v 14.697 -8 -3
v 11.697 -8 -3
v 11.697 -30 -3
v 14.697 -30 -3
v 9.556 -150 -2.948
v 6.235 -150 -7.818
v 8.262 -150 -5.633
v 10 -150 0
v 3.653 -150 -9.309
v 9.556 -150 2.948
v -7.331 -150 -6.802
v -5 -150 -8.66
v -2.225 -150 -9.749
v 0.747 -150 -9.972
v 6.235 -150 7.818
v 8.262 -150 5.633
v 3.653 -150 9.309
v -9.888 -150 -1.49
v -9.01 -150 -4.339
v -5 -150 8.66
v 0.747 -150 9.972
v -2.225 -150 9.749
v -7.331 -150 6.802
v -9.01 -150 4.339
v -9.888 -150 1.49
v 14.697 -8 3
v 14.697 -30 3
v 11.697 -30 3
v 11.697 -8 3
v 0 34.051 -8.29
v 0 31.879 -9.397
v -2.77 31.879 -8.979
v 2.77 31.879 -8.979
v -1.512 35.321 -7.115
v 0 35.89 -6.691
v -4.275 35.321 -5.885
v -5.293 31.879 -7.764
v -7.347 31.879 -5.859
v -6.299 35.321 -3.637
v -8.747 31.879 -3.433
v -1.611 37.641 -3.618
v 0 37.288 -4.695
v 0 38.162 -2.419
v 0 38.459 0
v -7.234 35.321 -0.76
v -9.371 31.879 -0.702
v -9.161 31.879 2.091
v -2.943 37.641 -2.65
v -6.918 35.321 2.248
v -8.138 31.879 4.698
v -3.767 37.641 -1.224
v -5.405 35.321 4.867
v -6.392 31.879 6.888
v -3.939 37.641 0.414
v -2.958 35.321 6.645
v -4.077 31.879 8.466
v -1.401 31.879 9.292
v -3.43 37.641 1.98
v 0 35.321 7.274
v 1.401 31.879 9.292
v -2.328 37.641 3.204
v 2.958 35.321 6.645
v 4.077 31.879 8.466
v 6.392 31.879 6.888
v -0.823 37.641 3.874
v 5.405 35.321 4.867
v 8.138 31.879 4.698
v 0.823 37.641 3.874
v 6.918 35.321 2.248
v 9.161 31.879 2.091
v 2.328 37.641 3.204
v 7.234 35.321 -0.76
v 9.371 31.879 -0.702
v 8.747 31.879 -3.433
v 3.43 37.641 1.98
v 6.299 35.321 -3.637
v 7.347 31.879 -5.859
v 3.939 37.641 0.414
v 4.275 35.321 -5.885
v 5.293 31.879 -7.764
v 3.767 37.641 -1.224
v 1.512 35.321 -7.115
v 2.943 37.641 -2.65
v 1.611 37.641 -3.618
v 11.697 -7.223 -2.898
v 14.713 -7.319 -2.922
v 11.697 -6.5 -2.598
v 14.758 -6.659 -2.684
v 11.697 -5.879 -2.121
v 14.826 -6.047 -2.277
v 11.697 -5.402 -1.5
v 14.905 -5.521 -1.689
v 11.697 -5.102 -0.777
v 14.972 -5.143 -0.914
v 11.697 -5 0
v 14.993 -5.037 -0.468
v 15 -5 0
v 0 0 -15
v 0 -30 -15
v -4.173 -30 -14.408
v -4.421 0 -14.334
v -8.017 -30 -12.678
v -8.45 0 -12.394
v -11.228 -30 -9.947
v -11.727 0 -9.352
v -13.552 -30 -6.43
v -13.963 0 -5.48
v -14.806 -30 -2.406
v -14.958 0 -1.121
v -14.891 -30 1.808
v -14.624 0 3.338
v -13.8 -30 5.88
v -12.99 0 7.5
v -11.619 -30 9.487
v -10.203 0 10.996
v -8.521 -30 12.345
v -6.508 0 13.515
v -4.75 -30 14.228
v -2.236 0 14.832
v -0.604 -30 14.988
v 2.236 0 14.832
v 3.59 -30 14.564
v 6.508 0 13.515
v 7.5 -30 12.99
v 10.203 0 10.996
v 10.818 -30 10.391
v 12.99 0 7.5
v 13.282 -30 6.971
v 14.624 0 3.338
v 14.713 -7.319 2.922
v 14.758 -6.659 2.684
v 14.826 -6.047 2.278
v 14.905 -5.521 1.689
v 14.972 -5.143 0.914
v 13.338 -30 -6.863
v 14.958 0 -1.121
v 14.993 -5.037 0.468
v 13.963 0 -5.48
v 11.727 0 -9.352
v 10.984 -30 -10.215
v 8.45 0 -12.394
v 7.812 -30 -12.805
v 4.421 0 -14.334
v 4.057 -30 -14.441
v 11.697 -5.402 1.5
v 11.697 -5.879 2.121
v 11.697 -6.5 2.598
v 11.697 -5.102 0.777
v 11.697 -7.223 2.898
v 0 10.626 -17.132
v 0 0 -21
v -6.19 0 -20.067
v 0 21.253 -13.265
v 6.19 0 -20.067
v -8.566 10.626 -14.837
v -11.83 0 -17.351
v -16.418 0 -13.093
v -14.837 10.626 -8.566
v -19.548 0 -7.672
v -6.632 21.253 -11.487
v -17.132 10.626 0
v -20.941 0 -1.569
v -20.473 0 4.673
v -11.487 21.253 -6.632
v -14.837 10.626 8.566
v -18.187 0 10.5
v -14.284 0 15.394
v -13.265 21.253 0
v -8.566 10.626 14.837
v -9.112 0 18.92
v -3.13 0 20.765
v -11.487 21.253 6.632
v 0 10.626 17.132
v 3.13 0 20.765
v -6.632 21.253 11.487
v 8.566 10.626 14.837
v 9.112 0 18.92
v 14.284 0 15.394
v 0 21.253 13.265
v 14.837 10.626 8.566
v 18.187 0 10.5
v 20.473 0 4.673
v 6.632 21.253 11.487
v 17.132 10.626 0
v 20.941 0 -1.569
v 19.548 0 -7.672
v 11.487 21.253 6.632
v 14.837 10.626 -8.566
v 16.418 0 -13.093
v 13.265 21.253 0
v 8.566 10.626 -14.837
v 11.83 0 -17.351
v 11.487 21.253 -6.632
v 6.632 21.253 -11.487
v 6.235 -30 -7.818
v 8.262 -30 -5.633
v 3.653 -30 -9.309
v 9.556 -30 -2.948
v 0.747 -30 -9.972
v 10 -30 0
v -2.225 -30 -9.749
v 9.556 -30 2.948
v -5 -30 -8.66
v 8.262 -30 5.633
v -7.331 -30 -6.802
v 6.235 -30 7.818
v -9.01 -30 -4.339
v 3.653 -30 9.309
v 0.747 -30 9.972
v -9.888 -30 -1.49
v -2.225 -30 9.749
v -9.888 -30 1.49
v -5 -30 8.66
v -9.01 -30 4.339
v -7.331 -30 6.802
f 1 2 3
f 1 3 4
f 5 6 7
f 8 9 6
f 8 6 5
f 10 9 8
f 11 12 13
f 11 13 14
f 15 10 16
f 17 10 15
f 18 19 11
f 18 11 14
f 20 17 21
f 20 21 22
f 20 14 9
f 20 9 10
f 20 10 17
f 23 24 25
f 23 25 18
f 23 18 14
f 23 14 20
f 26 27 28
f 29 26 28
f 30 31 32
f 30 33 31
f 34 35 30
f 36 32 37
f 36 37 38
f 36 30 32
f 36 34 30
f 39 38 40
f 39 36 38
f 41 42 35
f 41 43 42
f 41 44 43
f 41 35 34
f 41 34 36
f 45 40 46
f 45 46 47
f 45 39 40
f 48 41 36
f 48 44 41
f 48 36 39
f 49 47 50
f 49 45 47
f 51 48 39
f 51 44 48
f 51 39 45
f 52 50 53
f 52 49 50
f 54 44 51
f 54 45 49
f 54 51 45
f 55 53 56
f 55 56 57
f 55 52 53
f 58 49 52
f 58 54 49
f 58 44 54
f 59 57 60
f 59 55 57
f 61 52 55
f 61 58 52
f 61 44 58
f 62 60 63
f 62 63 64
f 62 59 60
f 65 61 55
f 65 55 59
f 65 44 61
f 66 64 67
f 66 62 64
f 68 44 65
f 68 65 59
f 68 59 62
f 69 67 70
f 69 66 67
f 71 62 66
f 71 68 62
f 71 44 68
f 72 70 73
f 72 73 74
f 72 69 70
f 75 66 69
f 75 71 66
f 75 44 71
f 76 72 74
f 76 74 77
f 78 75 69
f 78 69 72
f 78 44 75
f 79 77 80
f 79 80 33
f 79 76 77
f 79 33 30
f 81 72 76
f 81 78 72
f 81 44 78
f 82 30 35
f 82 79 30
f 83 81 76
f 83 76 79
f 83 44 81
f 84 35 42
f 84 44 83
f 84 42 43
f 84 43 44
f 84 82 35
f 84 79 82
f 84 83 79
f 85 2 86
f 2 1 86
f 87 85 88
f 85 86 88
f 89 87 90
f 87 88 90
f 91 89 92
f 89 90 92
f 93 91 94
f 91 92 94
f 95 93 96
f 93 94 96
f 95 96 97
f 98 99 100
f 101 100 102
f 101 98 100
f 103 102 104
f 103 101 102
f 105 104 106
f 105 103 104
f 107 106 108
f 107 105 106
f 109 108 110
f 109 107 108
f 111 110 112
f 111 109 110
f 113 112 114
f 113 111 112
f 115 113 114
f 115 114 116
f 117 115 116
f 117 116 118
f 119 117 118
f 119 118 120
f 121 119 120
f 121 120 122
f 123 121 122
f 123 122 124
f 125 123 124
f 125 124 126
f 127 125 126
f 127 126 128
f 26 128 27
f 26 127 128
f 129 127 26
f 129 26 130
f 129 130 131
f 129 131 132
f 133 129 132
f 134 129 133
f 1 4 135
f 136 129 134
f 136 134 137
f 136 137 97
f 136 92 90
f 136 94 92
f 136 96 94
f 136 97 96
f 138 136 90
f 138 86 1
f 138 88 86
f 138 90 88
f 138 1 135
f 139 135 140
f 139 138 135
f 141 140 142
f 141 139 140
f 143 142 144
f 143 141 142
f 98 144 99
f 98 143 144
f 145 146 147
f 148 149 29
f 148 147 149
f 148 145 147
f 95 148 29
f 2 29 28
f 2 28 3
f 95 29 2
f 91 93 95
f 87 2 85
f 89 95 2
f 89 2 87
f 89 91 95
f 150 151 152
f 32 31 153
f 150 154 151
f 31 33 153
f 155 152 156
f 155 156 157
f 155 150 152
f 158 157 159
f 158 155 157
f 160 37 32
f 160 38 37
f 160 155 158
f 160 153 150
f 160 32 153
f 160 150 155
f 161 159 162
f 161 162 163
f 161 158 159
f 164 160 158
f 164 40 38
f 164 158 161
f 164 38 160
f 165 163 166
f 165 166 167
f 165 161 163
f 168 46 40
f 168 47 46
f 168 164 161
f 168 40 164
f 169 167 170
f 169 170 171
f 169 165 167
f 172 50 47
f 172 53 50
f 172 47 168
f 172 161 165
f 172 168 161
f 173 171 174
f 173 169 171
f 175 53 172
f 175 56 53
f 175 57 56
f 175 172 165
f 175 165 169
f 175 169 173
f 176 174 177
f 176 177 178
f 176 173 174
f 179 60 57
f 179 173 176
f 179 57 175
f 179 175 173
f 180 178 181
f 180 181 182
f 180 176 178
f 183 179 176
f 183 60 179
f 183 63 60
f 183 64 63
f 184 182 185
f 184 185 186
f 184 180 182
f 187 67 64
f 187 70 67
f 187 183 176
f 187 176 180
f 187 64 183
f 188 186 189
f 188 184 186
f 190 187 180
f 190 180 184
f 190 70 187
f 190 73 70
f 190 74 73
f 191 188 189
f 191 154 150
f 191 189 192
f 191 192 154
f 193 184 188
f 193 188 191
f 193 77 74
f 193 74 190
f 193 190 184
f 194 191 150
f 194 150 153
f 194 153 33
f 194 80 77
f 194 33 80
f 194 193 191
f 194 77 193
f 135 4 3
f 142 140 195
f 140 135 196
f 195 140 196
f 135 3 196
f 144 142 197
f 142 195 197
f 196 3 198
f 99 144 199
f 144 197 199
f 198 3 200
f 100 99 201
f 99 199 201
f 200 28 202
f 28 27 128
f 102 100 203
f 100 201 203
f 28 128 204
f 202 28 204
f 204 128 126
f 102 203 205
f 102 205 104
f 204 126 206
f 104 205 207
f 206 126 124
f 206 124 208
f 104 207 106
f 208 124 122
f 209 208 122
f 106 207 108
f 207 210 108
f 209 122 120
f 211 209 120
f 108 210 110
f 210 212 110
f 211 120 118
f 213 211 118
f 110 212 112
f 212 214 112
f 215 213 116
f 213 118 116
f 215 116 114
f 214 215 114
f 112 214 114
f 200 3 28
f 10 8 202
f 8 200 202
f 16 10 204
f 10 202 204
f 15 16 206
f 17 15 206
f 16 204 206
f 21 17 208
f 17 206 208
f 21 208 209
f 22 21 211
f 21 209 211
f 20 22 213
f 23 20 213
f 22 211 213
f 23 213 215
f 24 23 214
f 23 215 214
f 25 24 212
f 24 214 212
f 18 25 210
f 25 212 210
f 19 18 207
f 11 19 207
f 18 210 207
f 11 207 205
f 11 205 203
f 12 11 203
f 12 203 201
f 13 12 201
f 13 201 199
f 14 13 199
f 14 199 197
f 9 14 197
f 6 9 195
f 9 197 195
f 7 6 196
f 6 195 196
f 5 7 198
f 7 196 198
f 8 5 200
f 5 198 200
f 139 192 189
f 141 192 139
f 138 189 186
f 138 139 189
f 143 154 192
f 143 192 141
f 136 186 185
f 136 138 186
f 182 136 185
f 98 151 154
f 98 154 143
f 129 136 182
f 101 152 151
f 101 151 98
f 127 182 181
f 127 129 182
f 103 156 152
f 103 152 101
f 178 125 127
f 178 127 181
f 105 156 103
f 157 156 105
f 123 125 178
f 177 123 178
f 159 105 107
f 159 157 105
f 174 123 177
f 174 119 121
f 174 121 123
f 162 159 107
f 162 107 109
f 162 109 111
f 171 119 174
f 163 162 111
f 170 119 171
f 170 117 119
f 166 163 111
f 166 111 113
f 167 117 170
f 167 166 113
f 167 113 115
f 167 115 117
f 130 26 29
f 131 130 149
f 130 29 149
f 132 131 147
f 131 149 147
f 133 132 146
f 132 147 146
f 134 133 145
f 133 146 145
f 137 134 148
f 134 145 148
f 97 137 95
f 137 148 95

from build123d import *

# Parameters (mm, degrees)
SKETCH2_W          = 5
SKETCH2_H          = 120
CUT_EXTRUDE1_START = -25
CUT_EXTRUDE1_DEPTH = 25
FILLET1_R          = 3


with BuildPart() as part:
    # Sketch1 → Revolve1 (revolve)
    with BuildSketch(Plane.XY, mode=Mode.PRIVATE) as revolve1_sk:
        with BuildLine():
            Line((0, -150), (15, -150))
            Line((15, -150), (15, 0))
            Line((15, 0), (21, 0))
            Line((21, 0), (9.396926208, 31.87918324))
            ThreePointArc((9.396926208, 31.87918324), (5.735764364, 36.65050225), (0, 38.458981807))
            Line((0, 38.458981807), (0, -150))
        make_face()
    revolve(revolve1_sk.sketch.rotate(Axis((0, -160.189242242, 0), (0, 1, 0)), 90), axis=Axis((0, -160.189242242, 0), (0, 1, 0)))

    # Sketch2 → Cut-Revolve1 (revolve, cut)
    with BuildSketch(Plane.XY):
        with Locations((12.5, -90)):
            Rectangle(SKETCH2_W, SKETCH2_H)
    revolve(axis=Axis((0, 9.42117093, 0), (0, -1, 0)), mode=Mode.SUBTRACT)

    # Sketch3 → Cut-Extrude1 (cut)
    with BuildSketch(Plane.XZ.offset(30).offset(CUT_EXTRUDE1_START)):
        with BuildLine():
            Line((14.696938457, 3), (11.696938457, 3))
            Line((11.696938457, 3), (11.696938457, -3))
            Line((11.696938457, -3), (14.696938457, -3))
            ThreePointArc((14.696938457, -3), (15, 0), (14.696938457, 3))
        make_face()
    extrude(amount=CUT_EXTRUDE1_DEPTH, mode=Mode.SUBTRACT)

    # Fillet1
    fillet1_edges = [part.edges().sort_by_distance(p)[0] for p in [
        (13.196938457, -5, 3),
        (13.196938457, -5, -3),
    ]]
    fillet(fillet1_edges, radius=FILLET1_R - 0.0001)  # a hair under: the kernel refuses the full size


solid = part.part
